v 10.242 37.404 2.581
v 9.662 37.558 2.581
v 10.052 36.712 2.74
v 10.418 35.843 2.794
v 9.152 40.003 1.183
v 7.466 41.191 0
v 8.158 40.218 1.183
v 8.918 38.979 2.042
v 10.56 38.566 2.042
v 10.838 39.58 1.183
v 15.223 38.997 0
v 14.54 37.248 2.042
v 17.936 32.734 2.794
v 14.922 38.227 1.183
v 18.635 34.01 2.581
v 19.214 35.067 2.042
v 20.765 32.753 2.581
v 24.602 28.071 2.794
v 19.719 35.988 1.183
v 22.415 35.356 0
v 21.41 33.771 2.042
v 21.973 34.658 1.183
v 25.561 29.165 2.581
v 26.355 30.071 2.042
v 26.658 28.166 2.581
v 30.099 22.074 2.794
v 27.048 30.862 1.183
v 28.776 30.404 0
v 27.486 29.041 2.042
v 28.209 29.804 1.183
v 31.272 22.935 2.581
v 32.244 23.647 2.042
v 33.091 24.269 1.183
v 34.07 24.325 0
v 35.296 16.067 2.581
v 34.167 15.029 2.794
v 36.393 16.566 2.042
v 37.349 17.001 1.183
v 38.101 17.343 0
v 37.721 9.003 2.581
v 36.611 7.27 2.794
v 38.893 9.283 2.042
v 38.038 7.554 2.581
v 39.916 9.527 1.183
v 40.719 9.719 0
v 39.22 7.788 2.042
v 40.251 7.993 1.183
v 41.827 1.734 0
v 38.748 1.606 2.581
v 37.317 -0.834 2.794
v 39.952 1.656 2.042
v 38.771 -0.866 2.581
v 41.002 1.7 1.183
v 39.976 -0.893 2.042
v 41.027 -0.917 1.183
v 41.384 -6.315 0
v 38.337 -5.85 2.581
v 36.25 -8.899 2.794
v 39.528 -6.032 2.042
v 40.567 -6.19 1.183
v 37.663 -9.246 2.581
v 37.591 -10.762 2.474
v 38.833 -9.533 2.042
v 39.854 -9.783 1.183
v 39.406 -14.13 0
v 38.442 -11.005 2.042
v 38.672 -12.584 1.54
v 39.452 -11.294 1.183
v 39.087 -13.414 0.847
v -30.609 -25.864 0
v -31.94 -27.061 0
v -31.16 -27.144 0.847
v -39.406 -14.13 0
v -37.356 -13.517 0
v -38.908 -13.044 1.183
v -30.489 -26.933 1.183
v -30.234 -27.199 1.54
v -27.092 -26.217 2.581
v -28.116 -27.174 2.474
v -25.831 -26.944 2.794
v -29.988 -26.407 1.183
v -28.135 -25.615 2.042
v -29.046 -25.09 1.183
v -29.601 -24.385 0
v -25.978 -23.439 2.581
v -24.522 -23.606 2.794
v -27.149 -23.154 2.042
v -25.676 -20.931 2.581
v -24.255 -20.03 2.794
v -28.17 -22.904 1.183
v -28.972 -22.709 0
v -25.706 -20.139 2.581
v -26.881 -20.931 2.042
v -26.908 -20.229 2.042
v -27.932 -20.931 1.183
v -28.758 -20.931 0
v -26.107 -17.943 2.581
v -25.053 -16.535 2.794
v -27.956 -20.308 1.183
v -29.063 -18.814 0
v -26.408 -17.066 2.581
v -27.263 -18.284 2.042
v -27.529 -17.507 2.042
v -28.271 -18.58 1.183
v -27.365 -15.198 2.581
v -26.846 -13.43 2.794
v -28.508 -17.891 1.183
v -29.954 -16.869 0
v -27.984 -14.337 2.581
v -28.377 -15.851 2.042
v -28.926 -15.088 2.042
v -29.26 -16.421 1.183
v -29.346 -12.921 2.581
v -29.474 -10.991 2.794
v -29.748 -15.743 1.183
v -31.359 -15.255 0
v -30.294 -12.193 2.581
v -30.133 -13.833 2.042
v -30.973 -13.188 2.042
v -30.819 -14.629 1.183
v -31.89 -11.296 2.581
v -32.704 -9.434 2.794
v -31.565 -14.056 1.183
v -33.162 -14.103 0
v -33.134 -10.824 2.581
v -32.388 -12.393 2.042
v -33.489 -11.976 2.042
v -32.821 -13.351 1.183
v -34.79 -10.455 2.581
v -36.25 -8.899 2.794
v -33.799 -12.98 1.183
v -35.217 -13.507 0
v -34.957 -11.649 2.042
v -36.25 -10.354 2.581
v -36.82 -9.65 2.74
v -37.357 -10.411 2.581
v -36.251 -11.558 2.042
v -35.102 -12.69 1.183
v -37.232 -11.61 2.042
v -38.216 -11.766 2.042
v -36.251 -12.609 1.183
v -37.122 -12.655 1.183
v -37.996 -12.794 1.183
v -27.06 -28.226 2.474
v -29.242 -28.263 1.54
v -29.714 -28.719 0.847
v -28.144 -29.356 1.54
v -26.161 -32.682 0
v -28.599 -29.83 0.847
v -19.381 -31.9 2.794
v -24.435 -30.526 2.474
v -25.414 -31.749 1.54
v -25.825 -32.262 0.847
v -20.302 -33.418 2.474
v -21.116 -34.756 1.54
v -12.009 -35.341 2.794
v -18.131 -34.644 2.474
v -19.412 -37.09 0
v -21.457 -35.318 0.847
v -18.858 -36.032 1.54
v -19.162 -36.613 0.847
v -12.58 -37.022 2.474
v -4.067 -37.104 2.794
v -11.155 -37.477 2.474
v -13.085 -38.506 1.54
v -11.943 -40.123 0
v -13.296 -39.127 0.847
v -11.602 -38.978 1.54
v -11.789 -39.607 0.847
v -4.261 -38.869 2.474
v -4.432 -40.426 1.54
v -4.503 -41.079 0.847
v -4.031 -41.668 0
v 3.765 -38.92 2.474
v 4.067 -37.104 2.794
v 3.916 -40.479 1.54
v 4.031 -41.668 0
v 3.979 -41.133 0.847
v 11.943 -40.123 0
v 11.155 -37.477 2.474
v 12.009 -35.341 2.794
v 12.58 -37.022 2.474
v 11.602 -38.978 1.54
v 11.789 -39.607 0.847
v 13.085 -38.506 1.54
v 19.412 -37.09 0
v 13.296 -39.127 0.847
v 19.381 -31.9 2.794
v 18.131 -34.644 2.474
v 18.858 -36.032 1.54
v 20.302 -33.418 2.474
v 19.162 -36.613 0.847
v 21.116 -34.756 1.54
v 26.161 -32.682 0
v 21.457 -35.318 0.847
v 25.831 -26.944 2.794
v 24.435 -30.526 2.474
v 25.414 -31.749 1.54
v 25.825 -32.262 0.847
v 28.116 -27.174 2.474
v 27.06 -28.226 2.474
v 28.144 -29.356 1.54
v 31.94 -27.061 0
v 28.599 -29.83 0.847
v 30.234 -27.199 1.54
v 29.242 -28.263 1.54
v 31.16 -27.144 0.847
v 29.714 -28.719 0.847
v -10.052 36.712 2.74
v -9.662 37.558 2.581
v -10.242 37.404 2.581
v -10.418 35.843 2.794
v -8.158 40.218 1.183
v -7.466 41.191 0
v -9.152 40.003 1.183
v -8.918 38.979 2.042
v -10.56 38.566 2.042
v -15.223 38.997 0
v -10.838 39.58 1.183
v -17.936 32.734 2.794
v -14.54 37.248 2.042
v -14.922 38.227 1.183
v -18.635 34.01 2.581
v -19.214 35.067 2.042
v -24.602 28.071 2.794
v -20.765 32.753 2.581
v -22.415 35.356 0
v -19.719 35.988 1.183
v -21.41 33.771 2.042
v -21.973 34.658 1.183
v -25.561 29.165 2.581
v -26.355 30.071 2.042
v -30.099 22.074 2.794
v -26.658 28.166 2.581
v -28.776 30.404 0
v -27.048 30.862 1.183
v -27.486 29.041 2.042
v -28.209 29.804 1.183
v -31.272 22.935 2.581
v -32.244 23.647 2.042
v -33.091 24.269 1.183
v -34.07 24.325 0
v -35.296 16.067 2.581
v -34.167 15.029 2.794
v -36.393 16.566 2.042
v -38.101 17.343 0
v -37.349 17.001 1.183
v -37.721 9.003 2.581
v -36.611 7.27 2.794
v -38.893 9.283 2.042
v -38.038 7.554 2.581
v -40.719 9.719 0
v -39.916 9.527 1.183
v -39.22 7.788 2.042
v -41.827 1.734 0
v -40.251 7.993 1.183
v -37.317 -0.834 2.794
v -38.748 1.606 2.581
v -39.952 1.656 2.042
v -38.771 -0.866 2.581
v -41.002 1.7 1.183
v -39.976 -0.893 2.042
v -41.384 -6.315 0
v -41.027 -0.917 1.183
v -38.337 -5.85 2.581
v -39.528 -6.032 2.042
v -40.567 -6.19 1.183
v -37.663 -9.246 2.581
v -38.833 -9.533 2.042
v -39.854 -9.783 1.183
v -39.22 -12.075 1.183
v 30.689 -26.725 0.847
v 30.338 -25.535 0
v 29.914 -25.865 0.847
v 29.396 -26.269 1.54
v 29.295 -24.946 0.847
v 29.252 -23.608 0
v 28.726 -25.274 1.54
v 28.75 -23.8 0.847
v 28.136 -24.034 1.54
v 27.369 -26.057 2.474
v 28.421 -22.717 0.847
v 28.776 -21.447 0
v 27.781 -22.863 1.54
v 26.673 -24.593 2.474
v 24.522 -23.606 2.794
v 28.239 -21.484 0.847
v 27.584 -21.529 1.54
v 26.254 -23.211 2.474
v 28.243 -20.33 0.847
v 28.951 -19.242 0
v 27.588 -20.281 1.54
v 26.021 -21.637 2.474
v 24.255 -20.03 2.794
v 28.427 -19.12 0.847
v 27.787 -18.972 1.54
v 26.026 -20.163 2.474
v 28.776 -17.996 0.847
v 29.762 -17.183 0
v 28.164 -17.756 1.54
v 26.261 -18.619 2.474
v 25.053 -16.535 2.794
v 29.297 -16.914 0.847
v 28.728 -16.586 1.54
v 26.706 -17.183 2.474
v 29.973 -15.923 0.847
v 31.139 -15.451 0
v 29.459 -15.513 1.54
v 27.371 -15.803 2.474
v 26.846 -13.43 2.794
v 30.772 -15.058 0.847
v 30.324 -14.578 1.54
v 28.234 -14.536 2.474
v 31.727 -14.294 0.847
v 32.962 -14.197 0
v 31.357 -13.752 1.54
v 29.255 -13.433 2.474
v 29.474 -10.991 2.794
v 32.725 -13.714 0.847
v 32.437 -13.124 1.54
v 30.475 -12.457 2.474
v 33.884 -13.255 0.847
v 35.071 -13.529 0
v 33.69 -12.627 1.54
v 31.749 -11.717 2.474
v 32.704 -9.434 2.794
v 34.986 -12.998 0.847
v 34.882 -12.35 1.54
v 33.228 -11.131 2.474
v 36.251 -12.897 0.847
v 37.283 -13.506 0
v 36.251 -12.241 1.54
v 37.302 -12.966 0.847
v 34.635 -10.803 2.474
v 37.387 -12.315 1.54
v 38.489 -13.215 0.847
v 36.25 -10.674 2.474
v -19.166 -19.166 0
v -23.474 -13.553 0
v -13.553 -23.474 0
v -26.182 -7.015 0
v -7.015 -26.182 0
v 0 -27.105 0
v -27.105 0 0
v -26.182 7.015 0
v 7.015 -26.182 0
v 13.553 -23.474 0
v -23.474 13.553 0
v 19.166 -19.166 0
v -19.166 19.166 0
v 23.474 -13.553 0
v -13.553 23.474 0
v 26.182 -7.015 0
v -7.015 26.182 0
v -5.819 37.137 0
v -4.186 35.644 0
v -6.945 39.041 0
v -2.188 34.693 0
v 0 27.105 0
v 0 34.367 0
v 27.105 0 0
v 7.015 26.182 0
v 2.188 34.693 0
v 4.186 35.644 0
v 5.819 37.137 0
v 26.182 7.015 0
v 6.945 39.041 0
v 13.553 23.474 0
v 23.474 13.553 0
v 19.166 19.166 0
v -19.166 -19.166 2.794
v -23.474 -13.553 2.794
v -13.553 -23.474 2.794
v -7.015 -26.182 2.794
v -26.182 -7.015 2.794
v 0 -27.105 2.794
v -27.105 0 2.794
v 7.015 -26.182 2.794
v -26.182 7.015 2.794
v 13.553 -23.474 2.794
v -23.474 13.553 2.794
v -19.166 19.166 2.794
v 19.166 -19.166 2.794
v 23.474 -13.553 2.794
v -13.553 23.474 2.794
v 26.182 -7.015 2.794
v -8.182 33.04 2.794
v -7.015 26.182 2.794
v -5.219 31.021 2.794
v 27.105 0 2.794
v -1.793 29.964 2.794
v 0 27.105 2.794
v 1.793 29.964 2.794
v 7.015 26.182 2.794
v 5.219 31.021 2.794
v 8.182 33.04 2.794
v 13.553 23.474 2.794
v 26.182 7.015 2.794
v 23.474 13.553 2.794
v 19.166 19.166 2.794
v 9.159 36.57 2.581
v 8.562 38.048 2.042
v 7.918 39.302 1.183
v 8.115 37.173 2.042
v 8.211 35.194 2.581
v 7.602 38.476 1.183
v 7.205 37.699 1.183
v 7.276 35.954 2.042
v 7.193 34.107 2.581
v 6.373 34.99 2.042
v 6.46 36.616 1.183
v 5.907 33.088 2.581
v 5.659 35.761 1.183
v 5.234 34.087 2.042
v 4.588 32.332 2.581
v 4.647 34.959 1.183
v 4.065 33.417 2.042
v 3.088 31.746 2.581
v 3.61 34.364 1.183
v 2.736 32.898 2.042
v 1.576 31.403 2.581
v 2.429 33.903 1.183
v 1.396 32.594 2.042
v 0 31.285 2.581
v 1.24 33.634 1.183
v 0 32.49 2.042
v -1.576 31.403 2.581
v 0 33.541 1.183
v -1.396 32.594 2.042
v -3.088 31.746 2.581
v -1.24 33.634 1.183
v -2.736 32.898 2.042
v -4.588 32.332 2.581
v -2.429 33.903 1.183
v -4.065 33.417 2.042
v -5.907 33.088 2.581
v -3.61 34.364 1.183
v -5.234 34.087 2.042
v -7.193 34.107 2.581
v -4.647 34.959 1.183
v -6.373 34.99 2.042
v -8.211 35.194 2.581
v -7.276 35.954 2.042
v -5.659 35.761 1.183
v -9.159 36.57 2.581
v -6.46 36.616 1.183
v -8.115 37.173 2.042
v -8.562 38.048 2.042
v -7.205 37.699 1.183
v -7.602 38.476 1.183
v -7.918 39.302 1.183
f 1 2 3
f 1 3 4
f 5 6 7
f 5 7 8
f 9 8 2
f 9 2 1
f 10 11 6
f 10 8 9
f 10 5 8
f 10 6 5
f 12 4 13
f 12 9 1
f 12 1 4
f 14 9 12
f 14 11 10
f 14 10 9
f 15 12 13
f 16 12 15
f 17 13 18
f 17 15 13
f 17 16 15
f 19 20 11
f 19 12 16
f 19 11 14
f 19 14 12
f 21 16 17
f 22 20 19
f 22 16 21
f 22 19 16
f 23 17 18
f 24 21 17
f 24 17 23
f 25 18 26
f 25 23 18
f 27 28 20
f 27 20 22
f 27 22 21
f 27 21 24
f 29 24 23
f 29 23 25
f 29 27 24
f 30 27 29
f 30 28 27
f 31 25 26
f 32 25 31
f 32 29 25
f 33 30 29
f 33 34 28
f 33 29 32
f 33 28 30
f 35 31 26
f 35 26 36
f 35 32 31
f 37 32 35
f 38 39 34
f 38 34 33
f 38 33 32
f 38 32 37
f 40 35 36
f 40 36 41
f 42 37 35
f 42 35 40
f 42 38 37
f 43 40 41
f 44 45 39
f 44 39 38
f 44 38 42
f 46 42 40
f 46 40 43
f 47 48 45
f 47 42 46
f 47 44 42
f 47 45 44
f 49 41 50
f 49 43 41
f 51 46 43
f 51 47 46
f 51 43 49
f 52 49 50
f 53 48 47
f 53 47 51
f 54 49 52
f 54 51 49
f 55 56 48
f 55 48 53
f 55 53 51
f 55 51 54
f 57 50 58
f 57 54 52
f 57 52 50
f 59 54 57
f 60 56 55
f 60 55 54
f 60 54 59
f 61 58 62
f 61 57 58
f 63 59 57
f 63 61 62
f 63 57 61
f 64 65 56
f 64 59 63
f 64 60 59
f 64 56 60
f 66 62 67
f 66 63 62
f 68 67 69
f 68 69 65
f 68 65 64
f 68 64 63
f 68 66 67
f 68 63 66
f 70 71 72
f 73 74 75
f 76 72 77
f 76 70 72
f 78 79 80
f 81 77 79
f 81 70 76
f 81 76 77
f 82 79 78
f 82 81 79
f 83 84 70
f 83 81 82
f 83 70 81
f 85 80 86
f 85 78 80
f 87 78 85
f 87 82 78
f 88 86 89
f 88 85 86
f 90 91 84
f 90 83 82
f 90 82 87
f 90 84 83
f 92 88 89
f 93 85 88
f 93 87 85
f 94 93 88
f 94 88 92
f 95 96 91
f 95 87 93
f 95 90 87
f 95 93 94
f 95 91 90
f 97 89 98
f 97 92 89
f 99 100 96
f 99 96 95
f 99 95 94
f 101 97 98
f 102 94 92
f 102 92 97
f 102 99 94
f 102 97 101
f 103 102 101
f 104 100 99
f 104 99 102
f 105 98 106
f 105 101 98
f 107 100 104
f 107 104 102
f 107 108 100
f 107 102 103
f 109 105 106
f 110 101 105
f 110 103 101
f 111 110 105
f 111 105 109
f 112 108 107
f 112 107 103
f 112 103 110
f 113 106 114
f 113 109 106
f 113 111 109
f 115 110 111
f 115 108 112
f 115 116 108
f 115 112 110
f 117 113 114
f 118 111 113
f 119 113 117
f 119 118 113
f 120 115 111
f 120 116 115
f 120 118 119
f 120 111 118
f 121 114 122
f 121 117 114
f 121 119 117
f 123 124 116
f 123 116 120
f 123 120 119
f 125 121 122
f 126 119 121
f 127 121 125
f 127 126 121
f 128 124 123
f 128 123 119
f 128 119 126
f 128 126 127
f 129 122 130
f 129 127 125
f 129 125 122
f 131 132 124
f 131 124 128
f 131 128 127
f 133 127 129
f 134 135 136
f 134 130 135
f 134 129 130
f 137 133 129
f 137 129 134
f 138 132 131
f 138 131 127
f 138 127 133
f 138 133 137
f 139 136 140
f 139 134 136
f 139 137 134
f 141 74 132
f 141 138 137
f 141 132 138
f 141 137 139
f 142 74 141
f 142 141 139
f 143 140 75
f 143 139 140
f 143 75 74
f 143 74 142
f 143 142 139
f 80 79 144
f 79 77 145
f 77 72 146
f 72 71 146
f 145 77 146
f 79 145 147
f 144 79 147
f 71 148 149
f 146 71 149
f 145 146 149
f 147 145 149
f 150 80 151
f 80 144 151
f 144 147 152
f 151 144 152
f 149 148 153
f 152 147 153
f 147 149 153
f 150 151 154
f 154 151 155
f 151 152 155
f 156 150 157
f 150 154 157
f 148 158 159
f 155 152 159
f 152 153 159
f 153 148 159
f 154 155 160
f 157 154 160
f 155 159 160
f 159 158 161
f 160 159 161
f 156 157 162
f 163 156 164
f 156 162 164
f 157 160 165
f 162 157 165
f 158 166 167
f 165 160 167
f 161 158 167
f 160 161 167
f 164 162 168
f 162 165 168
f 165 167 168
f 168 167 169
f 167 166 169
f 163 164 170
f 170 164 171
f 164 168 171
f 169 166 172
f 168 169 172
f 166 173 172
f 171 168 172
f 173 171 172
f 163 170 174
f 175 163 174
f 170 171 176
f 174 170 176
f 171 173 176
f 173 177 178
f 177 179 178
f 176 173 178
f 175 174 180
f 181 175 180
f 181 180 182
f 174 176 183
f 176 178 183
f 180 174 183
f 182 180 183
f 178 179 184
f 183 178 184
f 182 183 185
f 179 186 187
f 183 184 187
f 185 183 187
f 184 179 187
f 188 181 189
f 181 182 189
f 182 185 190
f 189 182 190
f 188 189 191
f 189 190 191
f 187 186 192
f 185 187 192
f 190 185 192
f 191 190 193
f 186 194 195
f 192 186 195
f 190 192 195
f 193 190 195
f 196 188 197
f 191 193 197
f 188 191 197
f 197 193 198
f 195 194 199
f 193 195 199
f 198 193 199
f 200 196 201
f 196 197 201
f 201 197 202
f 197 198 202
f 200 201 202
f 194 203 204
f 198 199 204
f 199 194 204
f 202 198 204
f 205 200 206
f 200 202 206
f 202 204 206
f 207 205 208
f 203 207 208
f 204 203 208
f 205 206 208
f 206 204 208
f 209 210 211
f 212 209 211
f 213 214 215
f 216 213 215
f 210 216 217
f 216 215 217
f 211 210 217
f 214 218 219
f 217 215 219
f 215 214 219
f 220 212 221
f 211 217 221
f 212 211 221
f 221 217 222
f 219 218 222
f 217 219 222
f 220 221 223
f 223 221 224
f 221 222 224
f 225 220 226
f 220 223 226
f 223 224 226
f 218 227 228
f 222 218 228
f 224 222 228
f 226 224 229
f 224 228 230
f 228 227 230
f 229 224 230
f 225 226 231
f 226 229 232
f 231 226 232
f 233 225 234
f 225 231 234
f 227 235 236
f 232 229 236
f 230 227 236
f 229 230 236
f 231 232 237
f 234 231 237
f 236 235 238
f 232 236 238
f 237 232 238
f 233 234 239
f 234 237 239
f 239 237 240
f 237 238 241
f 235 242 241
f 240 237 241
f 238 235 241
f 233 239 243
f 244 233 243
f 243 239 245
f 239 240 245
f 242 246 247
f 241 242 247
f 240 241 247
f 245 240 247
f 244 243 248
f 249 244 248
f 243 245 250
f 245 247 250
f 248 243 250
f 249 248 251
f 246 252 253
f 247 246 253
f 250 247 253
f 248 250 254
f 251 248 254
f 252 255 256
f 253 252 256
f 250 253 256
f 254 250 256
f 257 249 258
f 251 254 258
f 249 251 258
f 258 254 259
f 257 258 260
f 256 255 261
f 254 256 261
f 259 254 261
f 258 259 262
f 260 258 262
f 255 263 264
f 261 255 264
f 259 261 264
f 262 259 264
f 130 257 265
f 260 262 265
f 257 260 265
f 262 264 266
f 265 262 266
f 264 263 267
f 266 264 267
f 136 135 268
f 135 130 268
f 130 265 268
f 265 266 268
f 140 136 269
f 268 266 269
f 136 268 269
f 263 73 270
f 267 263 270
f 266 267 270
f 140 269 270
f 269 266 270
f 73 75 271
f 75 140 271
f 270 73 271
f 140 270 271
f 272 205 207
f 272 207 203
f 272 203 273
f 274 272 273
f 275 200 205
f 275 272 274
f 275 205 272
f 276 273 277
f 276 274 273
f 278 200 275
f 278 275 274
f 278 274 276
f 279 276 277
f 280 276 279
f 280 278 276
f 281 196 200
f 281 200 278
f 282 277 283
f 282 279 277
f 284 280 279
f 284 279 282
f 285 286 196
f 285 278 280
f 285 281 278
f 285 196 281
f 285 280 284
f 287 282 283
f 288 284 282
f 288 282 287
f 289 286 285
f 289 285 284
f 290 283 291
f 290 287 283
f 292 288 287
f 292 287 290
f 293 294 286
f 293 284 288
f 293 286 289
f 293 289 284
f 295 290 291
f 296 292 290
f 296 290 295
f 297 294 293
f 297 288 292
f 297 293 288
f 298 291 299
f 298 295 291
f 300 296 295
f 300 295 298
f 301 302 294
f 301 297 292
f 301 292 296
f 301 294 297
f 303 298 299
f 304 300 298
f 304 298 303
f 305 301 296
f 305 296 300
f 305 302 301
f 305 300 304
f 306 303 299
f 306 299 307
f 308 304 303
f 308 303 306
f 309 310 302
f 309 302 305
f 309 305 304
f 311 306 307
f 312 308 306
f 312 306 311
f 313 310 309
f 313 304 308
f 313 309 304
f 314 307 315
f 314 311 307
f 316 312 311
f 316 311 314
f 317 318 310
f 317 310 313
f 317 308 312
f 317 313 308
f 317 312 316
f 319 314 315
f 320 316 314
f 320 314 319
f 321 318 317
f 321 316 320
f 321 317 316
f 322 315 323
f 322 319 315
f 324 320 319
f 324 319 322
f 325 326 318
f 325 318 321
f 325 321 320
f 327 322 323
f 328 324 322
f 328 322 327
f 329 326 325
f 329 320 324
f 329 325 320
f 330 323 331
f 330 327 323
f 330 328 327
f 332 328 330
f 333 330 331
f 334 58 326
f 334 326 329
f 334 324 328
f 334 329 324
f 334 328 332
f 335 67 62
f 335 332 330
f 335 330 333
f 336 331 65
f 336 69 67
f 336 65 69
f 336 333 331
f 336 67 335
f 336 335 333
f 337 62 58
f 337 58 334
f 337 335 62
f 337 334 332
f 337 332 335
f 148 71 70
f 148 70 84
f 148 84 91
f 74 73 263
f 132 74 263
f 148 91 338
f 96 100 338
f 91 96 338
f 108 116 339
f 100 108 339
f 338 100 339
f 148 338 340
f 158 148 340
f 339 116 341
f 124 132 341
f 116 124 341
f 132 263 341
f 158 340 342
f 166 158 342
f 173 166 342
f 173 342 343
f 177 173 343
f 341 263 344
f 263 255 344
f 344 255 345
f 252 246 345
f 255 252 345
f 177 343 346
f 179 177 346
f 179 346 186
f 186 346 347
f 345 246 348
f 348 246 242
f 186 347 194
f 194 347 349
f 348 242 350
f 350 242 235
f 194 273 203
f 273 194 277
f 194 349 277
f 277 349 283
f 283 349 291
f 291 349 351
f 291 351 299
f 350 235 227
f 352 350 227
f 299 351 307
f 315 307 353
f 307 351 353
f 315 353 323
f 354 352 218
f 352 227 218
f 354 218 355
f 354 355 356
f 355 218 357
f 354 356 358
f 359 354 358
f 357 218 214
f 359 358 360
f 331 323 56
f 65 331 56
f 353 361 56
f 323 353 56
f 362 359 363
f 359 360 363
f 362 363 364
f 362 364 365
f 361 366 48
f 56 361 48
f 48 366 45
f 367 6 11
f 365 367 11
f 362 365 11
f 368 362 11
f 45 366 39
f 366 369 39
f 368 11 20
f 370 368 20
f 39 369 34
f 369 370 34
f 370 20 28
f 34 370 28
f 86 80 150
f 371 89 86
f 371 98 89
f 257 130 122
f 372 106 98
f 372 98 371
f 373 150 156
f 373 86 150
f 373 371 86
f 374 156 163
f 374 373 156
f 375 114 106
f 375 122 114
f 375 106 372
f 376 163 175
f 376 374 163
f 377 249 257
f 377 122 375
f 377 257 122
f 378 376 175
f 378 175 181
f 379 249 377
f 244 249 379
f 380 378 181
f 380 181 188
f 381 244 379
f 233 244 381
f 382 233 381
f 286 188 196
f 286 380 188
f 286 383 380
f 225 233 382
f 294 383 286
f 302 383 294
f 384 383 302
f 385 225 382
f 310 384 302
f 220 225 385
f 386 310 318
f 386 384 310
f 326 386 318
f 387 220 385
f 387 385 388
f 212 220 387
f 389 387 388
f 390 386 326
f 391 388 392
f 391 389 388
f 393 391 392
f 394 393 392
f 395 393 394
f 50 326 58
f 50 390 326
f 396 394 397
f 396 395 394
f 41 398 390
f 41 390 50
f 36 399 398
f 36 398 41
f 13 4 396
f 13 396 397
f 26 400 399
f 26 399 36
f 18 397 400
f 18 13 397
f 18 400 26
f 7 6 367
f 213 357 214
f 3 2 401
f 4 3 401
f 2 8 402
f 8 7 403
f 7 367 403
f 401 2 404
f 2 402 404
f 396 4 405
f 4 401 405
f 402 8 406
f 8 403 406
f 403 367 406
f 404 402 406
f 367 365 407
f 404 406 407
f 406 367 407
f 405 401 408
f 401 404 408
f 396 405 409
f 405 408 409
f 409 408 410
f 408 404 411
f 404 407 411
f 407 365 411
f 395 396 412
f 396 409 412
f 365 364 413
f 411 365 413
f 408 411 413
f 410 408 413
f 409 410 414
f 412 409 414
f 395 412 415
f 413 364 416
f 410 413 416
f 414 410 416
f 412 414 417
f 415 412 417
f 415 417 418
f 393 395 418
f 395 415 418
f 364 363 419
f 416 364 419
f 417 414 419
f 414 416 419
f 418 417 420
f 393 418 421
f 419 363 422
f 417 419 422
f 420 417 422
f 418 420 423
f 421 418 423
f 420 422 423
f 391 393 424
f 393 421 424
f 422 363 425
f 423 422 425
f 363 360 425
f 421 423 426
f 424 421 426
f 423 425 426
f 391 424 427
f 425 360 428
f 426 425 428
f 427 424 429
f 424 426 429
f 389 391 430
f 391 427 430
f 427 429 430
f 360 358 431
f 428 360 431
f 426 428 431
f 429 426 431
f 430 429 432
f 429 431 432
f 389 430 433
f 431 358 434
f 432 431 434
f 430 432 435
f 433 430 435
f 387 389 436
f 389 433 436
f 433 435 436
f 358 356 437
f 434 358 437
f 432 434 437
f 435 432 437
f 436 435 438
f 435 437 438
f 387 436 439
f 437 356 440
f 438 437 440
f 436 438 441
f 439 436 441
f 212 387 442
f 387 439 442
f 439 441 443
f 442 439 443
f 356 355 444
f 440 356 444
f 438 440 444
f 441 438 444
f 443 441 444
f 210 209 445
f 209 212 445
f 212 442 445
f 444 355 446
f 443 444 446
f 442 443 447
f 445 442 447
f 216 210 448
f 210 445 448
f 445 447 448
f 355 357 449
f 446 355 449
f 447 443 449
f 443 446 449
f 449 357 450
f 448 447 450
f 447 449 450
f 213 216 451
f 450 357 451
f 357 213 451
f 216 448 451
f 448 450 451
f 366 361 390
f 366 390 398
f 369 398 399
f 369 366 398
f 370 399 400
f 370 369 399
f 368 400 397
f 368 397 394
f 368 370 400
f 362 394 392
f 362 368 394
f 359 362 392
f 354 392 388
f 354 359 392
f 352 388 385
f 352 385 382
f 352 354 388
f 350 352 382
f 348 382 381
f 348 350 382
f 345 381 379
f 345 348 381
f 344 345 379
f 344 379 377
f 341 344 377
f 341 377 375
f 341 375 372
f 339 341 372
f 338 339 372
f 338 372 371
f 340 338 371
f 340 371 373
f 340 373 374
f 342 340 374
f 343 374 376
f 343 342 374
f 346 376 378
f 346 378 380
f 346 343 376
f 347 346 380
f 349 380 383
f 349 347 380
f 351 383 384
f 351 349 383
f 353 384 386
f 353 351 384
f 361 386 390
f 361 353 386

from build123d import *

# Parameters (mm, degrees)
F0_R         = 27.1053686487
F1_DEPTH     = 2.794
F2_T2_ANGLE  = 130.513894387
F2_T4_ANGLE  = 343.3509048615
F2_T6_ANGLE  = 130.513894387
F2_T8_ANGLE  = 343.3509048615
F2_T10_ANGLE = 130.513894387
F2_T12_ANGLE = 343.3509048615


# Not quite as in the source:
# - a fillet or chamfer that OpenCascade refuses, or shapes differently, is made with other operations: its cross-section is extruded or revolved along the edge and cut away or added


with BuildPart() as f1:
    # F0 (on Top) → F1 (new body)
    with BuildSketch(Plane.XY):
        with BuildLine():
            ThreePointArc((39.4058168676, -14.1300394968), (41.2438235607, -7.1710136852), (41.8625897333, 0))
            ThreePointArc((41.8625897333, 0), (32.1326921102, 26.8321918026), (7.4659352731, 41.1914582126))
            ThreePointArc((7.4659352731, 41.1914582126), (0, 34.366550311), (-7.4659352731, 41.1914582126))
            ThreePointArc((-7.4659352731, 41.1914582126), (-36.2540661773, 20.9312948667), (-39.4058168676, -14.1300394968))
            ThreePointArc((-39.4058168676, -14.1300394968), (-32.218910691, -14.6140069025), (-28.758026755, -20.9312948667))
            ThreePointArc((-28.758026755, -20.9312948667), (-29.6008750359, -24.3846489835), (-31.9398815945, -27.0614187158))
            ThreePointArc((-31.9398815945, -27.0614187158), (0, -41.8625897333), (31.9398815945, -27.0614187158))
            ThreePointArc((31.9398815945, -27.0614187158), (29.7623056098, -17.1832751555), (39.4058168676, -14.1300394968))
        make_face()
        Circle(F0_R, mode=Mode.SUBTRACT)
    extrude(amount=F1_DEPTH)

    # F2: fillet of radius 5.08 on 6 edges, made by hand

    # F2_s1 → F2_t2 (revolve, cut)
    with BuildSketch(Plane(origin=(0, 0, 0), x_dir=(0, 0, 1), z_dir=(0.9957938256, -0.0916223607, 0))):
        with BuildLine():
            ThreePointArc((2.794, -37.3260046741), (2.0394641369, -39.9899791484), (0, -41.8625897333))
            Line((0, -41.8625897333), (2.794, -41.8625897333))
            Line((2.794, -41.8625897333), (2.794, -37.3260046741))
        make_face()
    revolve(axis=Axis((0, 0, 2.794), (0, 0, 1)), revolution_arc=F2_T2_ANGLE, mode=Mode.SUBTRACT)

    # F2_s3 → F2_t4 (revolve, cut)
    with BuildSketch(Plane(origin=(3.7584385128, 4.7548188772, 0), x_dir=(0, 0, 1), z_dir=(0.6201152013, 0.7845107629, 0))):
        with BuildLine():
            ThreePointArc((0, 48.9175586674), (2.0394641369, 50.7901692523), (2.794, 53.4541437266))
            Line((2.794, 53.4541437266), (2.794, 48.9175586674))
            Line((2.794, 48.9175586674), (0, 48.9175586674))
        make_face()
    revolve(axis=Axis((36.2540661773, -20.9312948667, 2.794), (0, 0, -1)), revolution_arc=F2_T4_ANGLE, mode=Mode.SUBTRACT)

    # F2_s5 → F2_t6 (revolve, cut)
    with BuildSketch(Plane(origin=(0, 0, 0), x_dir=(0, 0, 1), z_dir=(-0.4185496208, 0.9081939302, 0))):
        with BuildLine():
            ThreePointArc((2.794, -37.3260046741), (2.0394641369, -39.9899791484), (0, -41.8625897333))
            Line((0, -41.8625897333), (2.794, -41.8625897333))
            Line((2.794, -41.8625897333), (2.794, -37.3260046741))
        make_face()
    revolve(axis=Axis((0, 0, 2.794), (0, 0, 1)), revolution_arc=F2_T6_ANGLE, mode=Mode.SUBTRACT)

    # F2_s7 → F2_t8 (revolve, cut)
    with BuildSketch(Plane(origin=(-3.7584385128, 4.7548188772, 0), x_dir=(0, 0, 1), z_dir=(-0.6201152013, 0.7845107629, 0))):
        with BuildLine():
            ThreePointArc((2.794, -53.4541437266), (2.0394641369, -50.7901692523), (0, -48.9175586674))
            Line((0, -48.9175586674), (2.794, -48.9175586674))
            Line((2.794, -48.9175586674), (2.794, -53.4541437266))
        make_face()
    revolve(axis=Axis((-36.2540661773, -20.9312948667, 2.794), (0, 0, 1)), revolution_arc=F2_T8_ANGLE, mode=Mode.SUBTRACT)

    # F2_s9 → F2_t10 (revolve, cut)
    with BuildSketch(Plane(origin=(0, 0, 0), x_dir=(0, 0, 1), z_dir=(-0.9957938256, -0.0916223607, 0))):
        with BuildLine():
            ThreePointArc((2.794, 37.3260046741), (2.0394641369, 39.9899791484), (0, 41.8625897333))
            Line((0, 41.8625897333), (2.794, 41.8625897333))
            Line((2.794, 41.8625897333), (2.794, 37.3260046741))
        make_face()
    revolve(axis=Axis((0, 0, 2.794), (0, 0, -1)), revolution_arc=F2_T10_ANGLE, mode=Mode.SUBTRACT)

    # F2_s11 → F2_t12 (revolve, cut)
    with BuildSketch(Plane(origin=(-5.9970131945, 0.877493792, 0), x_dir=(0, 0, 1), z_dir=(-0.9894638509, 0.1447801361, 0))):
        with BuildLine():
            ThreePointArc((2.794, 53.4541437266), (2.0394641369, 50.7901692523), (0, 48.9175586674))
            Line((0, 48.9175586674), (2.794, 48.9175586674))
            Line((2.794, 48.9175586674), (2.794, 53.4541437266))
        make_face()
    revolve(axis=Axis((0, 41.8625897333, 2.794), (0, 0, -1)), revolution_arc=F2_T12_ANGLE, mode=Mode.SUBTRACT)


solid = f1.part
